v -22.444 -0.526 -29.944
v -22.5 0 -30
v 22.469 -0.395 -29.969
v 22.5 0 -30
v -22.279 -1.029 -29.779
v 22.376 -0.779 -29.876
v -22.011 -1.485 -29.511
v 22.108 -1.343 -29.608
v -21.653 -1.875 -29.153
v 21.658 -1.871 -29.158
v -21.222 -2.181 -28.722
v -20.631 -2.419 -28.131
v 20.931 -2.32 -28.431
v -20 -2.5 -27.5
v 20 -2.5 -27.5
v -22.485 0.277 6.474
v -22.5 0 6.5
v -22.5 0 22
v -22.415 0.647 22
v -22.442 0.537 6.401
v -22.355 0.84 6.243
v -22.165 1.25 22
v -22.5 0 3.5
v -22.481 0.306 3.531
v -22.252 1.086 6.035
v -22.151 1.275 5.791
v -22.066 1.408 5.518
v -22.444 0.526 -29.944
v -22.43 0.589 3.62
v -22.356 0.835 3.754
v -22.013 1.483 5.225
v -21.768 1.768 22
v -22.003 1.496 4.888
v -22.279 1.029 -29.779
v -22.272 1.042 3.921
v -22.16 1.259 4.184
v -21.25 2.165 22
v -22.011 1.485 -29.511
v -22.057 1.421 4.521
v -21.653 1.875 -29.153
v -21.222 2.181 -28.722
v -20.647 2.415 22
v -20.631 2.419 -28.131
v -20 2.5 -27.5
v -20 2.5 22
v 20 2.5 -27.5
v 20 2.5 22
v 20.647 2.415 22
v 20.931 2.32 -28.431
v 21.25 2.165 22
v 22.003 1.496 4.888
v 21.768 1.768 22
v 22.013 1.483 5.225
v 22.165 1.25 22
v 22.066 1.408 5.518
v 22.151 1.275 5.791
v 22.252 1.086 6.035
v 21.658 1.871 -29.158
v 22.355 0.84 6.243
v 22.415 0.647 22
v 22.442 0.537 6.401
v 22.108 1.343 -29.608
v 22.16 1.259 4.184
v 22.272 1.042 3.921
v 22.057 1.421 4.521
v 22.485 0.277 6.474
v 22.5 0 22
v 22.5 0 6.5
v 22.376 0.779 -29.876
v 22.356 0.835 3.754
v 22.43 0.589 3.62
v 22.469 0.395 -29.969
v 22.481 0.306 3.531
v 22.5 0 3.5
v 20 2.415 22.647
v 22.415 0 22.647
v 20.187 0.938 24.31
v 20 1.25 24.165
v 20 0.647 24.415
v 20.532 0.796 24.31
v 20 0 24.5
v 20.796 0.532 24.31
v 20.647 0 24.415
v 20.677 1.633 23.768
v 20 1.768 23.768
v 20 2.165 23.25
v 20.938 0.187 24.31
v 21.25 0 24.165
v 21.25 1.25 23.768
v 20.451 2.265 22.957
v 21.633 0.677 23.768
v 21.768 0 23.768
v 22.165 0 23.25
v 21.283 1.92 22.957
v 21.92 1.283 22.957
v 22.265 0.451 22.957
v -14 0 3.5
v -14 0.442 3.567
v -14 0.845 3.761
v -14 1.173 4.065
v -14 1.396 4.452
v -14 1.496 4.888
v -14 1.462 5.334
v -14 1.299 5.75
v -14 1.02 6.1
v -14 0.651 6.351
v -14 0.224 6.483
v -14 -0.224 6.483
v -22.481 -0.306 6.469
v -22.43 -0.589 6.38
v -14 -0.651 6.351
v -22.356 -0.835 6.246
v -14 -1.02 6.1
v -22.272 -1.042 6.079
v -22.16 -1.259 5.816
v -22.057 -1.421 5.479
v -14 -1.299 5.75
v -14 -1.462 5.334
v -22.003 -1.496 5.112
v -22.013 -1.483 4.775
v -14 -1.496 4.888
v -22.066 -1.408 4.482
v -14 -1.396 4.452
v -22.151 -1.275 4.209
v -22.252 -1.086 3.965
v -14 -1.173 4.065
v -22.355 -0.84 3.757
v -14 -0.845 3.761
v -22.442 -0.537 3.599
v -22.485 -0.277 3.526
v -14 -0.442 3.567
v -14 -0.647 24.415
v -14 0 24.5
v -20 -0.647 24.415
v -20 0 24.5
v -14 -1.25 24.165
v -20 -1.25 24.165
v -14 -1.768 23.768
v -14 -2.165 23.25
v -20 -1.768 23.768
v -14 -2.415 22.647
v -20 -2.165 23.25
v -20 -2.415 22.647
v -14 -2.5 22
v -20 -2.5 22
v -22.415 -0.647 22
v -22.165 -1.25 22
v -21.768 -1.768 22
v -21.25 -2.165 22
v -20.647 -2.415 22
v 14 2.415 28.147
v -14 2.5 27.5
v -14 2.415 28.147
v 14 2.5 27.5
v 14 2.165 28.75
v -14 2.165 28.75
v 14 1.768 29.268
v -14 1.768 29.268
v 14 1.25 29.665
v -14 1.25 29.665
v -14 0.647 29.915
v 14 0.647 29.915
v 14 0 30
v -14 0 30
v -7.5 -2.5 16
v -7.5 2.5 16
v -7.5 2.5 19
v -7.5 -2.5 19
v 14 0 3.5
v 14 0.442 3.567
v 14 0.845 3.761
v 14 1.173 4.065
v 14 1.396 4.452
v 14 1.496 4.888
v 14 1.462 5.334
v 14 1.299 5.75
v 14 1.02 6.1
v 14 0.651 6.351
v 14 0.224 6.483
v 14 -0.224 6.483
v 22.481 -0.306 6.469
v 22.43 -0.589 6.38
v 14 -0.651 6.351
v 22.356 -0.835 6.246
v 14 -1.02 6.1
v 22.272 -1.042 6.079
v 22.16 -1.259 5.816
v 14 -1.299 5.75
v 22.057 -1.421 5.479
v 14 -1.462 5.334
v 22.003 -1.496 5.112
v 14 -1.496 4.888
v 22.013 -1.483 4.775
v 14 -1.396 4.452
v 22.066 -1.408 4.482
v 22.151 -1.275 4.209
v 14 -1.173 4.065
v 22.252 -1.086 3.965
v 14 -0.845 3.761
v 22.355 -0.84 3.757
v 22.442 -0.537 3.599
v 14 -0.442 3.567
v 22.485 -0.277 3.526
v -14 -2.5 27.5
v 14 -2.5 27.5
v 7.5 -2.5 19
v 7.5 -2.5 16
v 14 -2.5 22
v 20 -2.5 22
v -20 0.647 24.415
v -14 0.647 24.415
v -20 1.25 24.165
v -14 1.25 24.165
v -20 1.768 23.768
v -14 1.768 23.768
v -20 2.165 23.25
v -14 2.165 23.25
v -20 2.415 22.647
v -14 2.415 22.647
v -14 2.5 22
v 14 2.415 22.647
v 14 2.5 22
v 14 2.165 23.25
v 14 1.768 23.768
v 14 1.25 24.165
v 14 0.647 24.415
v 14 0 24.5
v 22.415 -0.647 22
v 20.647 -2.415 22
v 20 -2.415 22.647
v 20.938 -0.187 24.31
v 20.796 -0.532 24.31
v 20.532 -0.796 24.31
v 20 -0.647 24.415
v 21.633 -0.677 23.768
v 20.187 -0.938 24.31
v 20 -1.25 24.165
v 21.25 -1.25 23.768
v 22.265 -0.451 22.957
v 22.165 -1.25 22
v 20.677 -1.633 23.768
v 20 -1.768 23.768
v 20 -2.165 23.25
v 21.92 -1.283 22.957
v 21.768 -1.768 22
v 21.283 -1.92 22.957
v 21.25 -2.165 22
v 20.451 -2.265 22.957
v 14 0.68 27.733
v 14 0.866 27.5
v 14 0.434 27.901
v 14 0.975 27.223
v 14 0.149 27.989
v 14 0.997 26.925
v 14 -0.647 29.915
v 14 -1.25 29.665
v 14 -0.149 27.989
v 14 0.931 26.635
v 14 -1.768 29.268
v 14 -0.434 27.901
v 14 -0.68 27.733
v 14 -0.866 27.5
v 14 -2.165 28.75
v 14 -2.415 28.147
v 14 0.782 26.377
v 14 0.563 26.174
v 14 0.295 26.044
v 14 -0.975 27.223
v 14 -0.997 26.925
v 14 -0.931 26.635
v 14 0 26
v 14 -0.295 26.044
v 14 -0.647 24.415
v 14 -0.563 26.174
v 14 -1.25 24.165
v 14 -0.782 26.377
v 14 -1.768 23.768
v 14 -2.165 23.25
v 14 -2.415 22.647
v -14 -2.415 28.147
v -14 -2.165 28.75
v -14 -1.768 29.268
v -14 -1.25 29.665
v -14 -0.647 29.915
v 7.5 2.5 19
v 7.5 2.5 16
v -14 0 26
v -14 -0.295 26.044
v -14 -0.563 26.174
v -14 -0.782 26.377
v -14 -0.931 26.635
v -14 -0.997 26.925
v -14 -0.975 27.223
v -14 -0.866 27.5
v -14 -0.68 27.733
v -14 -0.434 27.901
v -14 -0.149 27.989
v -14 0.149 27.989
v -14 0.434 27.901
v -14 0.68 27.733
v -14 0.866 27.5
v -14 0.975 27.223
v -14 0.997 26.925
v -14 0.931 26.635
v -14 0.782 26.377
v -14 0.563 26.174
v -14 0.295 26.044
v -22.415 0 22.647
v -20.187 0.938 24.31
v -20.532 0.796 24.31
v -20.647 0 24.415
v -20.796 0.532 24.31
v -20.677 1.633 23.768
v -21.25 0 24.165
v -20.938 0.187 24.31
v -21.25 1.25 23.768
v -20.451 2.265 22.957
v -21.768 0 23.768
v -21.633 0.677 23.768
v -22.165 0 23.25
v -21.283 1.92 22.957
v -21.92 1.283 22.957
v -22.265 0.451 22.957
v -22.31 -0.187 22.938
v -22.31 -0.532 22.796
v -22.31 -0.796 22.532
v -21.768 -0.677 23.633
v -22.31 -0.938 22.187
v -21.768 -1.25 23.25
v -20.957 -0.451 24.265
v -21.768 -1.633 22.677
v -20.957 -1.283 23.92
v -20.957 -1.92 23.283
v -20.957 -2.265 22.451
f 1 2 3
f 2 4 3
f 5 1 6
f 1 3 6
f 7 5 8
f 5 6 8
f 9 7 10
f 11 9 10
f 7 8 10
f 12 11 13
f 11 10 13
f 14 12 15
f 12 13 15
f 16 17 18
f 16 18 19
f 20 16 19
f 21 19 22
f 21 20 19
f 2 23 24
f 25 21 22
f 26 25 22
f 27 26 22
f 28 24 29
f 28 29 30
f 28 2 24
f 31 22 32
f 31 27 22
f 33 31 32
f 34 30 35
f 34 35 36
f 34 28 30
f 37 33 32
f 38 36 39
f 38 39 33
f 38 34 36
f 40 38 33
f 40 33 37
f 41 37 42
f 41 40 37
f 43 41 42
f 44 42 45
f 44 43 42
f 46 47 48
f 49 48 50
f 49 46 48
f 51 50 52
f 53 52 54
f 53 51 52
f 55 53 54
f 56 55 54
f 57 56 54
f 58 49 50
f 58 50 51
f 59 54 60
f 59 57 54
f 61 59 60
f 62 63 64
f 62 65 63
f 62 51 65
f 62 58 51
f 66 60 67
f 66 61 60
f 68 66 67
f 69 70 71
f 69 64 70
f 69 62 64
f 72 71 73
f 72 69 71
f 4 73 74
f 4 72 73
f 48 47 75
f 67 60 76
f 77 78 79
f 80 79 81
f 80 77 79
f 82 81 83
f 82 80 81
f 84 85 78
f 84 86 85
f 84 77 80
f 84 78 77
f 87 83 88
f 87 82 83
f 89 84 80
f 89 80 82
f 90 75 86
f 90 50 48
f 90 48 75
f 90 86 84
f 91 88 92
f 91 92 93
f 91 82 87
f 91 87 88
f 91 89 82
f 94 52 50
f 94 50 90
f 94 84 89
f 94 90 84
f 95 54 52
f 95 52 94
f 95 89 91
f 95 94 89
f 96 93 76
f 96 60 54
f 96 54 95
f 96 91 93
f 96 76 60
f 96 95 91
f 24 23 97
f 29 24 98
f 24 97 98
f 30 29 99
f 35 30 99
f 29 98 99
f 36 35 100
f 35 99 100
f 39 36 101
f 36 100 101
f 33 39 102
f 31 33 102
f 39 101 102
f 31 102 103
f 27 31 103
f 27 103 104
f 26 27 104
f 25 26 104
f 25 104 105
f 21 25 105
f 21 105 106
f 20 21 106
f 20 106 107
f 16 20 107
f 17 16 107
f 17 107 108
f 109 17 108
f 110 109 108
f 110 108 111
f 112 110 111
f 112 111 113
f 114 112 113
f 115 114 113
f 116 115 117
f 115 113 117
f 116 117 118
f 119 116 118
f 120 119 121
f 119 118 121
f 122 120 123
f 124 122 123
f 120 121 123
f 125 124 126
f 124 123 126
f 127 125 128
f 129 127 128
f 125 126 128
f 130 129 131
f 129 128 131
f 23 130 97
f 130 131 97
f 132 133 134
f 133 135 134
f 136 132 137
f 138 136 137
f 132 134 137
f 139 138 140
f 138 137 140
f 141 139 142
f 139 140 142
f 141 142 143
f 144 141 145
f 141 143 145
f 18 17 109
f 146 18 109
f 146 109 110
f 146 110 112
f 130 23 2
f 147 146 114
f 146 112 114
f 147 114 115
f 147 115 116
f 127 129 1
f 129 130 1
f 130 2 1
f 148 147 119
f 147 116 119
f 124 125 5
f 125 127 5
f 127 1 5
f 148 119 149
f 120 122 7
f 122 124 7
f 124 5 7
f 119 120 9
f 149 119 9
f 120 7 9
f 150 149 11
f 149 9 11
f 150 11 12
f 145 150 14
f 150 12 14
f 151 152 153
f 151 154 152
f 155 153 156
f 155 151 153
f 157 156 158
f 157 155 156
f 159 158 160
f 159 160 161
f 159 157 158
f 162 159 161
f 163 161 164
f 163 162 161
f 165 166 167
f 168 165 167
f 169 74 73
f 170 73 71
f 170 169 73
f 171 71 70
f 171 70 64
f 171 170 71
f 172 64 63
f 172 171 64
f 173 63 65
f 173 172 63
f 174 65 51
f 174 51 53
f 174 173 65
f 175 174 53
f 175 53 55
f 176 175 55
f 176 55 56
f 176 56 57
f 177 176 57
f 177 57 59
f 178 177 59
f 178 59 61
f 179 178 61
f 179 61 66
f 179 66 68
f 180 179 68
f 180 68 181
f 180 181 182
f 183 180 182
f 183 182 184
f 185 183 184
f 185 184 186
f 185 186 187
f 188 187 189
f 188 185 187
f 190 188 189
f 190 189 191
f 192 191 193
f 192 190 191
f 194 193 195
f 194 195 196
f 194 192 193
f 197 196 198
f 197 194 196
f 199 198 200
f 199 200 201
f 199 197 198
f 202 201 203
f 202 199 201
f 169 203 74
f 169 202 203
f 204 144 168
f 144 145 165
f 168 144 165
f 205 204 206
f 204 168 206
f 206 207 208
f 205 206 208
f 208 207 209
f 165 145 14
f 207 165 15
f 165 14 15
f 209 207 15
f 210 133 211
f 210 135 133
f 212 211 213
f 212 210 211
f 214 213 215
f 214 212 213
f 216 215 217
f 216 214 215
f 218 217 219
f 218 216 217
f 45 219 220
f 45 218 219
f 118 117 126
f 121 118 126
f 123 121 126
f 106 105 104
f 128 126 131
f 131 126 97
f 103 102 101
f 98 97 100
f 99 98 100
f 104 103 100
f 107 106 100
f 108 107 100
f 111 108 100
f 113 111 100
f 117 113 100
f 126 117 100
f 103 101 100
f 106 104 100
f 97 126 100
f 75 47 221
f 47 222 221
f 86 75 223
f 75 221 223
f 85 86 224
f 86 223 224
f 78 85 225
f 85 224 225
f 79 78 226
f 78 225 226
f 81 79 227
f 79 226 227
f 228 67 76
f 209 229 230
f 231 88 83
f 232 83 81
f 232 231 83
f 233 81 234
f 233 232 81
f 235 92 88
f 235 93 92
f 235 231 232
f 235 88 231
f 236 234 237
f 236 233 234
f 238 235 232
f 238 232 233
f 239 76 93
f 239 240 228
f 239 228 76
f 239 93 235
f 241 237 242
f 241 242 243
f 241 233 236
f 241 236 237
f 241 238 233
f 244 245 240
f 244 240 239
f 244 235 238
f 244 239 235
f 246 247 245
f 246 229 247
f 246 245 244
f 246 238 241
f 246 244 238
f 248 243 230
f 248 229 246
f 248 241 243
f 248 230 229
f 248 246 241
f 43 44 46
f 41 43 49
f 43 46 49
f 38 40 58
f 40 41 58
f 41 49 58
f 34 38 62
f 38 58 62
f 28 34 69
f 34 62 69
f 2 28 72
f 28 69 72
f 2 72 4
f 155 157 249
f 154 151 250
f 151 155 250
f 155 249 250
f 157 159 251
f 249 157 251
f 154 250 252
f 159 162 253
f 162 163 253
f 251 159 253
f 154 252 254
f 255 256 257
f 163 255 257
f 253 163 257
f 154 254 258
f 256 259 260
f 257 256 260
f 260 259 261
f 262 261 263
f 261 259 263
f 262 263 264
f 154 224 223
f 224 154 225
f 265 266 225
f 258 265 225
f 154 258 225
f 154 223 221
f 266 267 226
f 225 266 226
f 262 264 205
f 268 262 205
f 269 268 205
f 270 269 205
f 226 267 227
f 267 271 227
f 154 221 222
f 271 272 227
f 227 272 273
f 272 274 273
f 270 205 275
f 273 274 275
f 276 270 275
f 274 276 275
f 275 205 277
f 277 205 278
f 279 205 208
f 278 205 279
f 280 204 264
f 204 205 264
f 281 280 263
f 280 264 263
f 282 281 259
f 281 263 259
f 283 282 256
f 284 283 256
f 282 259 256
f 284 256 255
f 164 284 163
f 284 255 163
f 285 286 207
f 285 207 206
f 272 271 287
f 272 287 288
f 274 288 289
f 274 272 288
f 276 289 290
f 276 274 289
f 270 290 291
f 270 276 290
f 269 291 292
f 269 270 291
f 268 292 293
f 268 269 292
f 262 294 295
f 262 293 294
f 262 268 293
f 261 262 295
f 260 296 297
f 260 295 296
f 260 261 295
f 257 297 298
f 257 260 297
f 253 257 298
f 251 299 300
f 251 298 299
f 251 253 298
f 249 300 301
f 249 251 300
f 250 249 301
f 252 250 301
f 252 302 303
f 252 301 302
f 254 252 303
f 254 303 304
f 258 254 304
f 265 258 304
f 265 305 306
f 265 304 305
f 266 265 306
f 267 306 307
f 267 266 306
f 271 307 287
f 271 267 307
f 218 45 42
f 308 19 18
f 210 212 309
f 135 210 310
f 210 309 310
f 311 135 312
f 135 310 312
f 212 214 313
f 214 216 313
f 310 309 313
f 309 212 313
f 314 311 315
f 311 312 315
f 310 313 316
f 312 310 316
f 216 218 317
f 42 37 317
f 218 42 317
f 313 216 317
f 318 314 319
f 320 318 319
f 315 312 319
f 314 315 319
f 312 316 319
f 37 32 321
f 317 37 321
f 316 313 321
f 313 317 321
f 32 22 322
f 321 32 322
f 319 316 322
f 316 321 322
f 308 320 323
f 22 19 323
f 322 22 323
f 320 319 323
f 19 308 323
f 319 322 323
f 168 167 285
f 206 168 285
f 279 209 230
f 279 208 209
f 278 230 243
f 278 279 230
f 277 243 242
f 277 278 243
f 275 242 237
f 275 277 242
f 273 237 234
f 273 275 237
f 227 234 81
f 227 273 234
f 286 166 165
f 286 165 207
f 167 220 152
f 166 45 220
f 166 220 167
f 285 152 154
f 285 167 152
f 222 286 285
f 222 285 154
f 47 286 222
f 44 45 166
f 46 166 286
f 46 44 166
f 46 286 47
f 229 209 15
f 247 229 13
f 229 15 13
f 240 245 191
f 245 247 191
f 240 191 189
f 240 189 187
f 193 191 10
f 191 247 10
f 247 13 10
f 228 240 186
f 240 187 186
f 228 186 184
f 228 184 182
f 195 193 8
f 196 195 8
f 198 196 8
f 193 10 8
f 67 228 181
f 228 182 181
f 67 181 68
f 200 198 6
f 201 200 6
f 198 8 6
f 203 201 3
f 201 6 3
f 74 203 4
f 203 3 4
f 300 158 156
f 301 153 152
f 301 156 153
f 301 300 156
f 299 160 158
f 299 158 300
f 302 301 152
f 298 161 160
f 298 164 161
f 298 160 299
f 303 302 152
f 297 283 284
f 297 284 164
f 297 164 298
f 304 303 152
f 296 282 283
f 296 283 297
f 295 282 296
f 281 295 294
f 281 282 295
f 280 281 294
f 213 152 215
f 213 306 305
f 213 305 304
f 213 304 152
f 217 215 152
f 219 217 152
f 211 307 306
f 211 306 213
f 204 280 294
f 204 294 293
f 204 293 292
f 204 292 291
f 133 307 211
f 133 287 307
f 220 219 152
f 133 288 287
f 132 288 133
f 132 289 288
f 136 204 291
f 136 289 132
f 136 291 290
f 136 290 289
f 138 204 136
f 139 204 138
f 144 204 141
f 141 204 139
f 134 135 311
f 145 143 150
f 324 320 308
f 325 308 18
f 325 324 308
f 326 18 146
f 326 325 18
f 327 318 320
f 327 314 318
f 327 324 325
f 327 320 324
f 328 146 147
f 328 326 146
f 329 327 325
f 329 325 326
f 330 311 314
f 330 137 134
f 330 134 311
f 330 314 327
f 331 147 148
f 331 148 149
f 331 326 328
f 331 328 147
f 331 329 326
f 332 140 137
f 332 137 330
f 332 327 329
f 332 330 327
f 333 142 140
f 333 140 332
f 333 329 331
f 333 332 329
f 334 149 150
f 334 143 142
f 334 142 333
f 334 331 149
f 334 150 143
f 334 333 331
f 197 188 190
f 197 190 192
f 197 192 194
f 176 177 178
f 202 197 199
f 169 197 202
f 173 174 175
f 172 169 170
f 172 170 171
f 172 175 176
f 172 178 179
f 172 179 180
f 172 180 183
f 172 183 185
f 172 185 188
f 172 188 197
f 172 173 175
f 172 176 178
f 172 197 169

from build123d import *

# Parameters (mm, degrees)
SKETCH1_W               = 45
SKETCH1_H               = 60
BOSS_EXTRUDE1_DEPTH     = 2.5
CUT_EXTRUDE1_DEPTH      = 38.831864876
CUT_EXTRUDE1_DEPTH_BACK = 38.831864876
SKETCH2_W               = 8.5
SKETCH2_H               = 5.5
CUT_EXTRUDE2_DEPTH      = 48.312788969
CUT_EXTRUDE2_DEPTH_BACK = 48.312788969
SKETCH9_R               = 1
FILLET1_R               = 2.5
CUT_EXTRUDE3_DEPTH      = 38.831864876
CUT_EXTRUDE3_DEPTH_BACK = 38.831864876
SKETCH13_W              = 15
SKETCH13_H              = 3
CUT_EXTRUDE4_START      = -6
SKETCH11_R              = 1.5
CUT_EXTRUDE4_DEPTH      = 59.08166664


with BuildPart() as part:
    # Sketch1 → Boss-Extrude1 (new, symmetric)
    with BuildSketch(Plane(origin=(0, 0, 0), x_dir=(1, 0, 0), z_dir=(0, 1, 0))):
        Rectangle(SKETCH1_W, SKETCH1_H)
    extrude(amount=BOSS_EXTRUDE1_DEPTH, both=True)

    # Sketch2 → Cut-Extrude1 (cut, two sides: drawn at the far end of the back side and taken through both)
    with BuildSketch(Plane(origin=(0, 2.5, 0), x_dir=(1, 0, 0), z_dir=(0, 1, 0)).offset(-CUT_EXTRUDE1_DEPTH_BACK)):
        with Locations((-18.25, -27.25)):
            Rectangle(SKETCH2_W, SKETCH2_H)
        with Locations((18.25, -27.25)):
            Rectangle(SKETCH2_W, SKETCH2_H)
    extrude(amount=CUT_EXTRUDE1_DEPTH + CUT_EXTRUDE1_DEPTH_BACK, mode=Mode.SUBTRACT)

    # Sketch9 → Cut-Extrude2 (cut, two sides: drawn at the far end of the back side and taken through both)
    with BuildSketch(Plane.ZY.offset(14).offset(-CUT_EXTRUDE2_DEPTH_BACK)):
        with Locations(Location((27, 0, 0), (0, 0, 180))):
            Circle(SKETCH9_R)
    extrude(amount=CUT_EXTRUDE2_DEPTH + CUT_EXTRUDE2_DEPTH_BACK, mode=Mode.SUBTRACT)

    # Fillet1
    fillet1_edges = [part.edges().sort_by_distance(p)[0] for p in [
        (-22.5, 2.5, -2.75),
        (22.5, -2.5, -2.75),
        (0, -2.5, 30),
        (22.5, 2.5, -2.75),
        (0, 2.5, 30),
        (-18.25, 2.5, 24.5),
        (-18.25, -2.5, 24.5),
        (-22.5, 0, 24.5),
        (18.25, 2.5, 24.5),
        (22.5, 0, 24.5),
        (18.25, -2.5, 24.5),
        (-22.5, -2.5, -2.75),
        (0, -2.5, -30),
        (0, 2.5, -30),
    ]]
    fillet(fillet1_edges, radius=FILLET1_R - 0.0001)  # a hair under: the kernel refuses the full size

    # Sketch13 → Cut-Extrude3 (cut, two sides: drawn at the far end of the back side and taken through both)
    with BuildSketch(Plane.XZ.offset(2.5).offset(-CUT_EXTRUDE3_DEPTH_BACK)):
        with Locations((0, 17.5)):
            Rectangle(SKETCH13_W, SKETCH13_H)
    extrude(amount=CUT_EXTRUDE3_DEPTH + CUT_EXTRUDE3_DEPTH_BACK, mode=Mode.SUBTRACT)

    # Sketch11 → Cut-Extrude4 (cut)
    with BuildSketch(Plane(origin=(20, 0, 0), x_dir=(0, 0, -1), z_dir=(1, 0, 0)).offset(CUT_EXTRUDE4_START)):
        with Locations((-5, 0)):
            Circle(SKETCH11_R)
    cut_extrude4 = extrude(amount=CUT_EXTRUDE4_DEPTH, mode=Mode.SUBTRACT)

    # Mirror1: Cut-Extrude4 across plane
    add(cut_extrude4.mirror(Plane(origin=(0, 0, 0), x_dir=(0, 0, 1), z_dir=(1, 0, 0))), mode=Mode.SUBTRACT)


solid = part.part
